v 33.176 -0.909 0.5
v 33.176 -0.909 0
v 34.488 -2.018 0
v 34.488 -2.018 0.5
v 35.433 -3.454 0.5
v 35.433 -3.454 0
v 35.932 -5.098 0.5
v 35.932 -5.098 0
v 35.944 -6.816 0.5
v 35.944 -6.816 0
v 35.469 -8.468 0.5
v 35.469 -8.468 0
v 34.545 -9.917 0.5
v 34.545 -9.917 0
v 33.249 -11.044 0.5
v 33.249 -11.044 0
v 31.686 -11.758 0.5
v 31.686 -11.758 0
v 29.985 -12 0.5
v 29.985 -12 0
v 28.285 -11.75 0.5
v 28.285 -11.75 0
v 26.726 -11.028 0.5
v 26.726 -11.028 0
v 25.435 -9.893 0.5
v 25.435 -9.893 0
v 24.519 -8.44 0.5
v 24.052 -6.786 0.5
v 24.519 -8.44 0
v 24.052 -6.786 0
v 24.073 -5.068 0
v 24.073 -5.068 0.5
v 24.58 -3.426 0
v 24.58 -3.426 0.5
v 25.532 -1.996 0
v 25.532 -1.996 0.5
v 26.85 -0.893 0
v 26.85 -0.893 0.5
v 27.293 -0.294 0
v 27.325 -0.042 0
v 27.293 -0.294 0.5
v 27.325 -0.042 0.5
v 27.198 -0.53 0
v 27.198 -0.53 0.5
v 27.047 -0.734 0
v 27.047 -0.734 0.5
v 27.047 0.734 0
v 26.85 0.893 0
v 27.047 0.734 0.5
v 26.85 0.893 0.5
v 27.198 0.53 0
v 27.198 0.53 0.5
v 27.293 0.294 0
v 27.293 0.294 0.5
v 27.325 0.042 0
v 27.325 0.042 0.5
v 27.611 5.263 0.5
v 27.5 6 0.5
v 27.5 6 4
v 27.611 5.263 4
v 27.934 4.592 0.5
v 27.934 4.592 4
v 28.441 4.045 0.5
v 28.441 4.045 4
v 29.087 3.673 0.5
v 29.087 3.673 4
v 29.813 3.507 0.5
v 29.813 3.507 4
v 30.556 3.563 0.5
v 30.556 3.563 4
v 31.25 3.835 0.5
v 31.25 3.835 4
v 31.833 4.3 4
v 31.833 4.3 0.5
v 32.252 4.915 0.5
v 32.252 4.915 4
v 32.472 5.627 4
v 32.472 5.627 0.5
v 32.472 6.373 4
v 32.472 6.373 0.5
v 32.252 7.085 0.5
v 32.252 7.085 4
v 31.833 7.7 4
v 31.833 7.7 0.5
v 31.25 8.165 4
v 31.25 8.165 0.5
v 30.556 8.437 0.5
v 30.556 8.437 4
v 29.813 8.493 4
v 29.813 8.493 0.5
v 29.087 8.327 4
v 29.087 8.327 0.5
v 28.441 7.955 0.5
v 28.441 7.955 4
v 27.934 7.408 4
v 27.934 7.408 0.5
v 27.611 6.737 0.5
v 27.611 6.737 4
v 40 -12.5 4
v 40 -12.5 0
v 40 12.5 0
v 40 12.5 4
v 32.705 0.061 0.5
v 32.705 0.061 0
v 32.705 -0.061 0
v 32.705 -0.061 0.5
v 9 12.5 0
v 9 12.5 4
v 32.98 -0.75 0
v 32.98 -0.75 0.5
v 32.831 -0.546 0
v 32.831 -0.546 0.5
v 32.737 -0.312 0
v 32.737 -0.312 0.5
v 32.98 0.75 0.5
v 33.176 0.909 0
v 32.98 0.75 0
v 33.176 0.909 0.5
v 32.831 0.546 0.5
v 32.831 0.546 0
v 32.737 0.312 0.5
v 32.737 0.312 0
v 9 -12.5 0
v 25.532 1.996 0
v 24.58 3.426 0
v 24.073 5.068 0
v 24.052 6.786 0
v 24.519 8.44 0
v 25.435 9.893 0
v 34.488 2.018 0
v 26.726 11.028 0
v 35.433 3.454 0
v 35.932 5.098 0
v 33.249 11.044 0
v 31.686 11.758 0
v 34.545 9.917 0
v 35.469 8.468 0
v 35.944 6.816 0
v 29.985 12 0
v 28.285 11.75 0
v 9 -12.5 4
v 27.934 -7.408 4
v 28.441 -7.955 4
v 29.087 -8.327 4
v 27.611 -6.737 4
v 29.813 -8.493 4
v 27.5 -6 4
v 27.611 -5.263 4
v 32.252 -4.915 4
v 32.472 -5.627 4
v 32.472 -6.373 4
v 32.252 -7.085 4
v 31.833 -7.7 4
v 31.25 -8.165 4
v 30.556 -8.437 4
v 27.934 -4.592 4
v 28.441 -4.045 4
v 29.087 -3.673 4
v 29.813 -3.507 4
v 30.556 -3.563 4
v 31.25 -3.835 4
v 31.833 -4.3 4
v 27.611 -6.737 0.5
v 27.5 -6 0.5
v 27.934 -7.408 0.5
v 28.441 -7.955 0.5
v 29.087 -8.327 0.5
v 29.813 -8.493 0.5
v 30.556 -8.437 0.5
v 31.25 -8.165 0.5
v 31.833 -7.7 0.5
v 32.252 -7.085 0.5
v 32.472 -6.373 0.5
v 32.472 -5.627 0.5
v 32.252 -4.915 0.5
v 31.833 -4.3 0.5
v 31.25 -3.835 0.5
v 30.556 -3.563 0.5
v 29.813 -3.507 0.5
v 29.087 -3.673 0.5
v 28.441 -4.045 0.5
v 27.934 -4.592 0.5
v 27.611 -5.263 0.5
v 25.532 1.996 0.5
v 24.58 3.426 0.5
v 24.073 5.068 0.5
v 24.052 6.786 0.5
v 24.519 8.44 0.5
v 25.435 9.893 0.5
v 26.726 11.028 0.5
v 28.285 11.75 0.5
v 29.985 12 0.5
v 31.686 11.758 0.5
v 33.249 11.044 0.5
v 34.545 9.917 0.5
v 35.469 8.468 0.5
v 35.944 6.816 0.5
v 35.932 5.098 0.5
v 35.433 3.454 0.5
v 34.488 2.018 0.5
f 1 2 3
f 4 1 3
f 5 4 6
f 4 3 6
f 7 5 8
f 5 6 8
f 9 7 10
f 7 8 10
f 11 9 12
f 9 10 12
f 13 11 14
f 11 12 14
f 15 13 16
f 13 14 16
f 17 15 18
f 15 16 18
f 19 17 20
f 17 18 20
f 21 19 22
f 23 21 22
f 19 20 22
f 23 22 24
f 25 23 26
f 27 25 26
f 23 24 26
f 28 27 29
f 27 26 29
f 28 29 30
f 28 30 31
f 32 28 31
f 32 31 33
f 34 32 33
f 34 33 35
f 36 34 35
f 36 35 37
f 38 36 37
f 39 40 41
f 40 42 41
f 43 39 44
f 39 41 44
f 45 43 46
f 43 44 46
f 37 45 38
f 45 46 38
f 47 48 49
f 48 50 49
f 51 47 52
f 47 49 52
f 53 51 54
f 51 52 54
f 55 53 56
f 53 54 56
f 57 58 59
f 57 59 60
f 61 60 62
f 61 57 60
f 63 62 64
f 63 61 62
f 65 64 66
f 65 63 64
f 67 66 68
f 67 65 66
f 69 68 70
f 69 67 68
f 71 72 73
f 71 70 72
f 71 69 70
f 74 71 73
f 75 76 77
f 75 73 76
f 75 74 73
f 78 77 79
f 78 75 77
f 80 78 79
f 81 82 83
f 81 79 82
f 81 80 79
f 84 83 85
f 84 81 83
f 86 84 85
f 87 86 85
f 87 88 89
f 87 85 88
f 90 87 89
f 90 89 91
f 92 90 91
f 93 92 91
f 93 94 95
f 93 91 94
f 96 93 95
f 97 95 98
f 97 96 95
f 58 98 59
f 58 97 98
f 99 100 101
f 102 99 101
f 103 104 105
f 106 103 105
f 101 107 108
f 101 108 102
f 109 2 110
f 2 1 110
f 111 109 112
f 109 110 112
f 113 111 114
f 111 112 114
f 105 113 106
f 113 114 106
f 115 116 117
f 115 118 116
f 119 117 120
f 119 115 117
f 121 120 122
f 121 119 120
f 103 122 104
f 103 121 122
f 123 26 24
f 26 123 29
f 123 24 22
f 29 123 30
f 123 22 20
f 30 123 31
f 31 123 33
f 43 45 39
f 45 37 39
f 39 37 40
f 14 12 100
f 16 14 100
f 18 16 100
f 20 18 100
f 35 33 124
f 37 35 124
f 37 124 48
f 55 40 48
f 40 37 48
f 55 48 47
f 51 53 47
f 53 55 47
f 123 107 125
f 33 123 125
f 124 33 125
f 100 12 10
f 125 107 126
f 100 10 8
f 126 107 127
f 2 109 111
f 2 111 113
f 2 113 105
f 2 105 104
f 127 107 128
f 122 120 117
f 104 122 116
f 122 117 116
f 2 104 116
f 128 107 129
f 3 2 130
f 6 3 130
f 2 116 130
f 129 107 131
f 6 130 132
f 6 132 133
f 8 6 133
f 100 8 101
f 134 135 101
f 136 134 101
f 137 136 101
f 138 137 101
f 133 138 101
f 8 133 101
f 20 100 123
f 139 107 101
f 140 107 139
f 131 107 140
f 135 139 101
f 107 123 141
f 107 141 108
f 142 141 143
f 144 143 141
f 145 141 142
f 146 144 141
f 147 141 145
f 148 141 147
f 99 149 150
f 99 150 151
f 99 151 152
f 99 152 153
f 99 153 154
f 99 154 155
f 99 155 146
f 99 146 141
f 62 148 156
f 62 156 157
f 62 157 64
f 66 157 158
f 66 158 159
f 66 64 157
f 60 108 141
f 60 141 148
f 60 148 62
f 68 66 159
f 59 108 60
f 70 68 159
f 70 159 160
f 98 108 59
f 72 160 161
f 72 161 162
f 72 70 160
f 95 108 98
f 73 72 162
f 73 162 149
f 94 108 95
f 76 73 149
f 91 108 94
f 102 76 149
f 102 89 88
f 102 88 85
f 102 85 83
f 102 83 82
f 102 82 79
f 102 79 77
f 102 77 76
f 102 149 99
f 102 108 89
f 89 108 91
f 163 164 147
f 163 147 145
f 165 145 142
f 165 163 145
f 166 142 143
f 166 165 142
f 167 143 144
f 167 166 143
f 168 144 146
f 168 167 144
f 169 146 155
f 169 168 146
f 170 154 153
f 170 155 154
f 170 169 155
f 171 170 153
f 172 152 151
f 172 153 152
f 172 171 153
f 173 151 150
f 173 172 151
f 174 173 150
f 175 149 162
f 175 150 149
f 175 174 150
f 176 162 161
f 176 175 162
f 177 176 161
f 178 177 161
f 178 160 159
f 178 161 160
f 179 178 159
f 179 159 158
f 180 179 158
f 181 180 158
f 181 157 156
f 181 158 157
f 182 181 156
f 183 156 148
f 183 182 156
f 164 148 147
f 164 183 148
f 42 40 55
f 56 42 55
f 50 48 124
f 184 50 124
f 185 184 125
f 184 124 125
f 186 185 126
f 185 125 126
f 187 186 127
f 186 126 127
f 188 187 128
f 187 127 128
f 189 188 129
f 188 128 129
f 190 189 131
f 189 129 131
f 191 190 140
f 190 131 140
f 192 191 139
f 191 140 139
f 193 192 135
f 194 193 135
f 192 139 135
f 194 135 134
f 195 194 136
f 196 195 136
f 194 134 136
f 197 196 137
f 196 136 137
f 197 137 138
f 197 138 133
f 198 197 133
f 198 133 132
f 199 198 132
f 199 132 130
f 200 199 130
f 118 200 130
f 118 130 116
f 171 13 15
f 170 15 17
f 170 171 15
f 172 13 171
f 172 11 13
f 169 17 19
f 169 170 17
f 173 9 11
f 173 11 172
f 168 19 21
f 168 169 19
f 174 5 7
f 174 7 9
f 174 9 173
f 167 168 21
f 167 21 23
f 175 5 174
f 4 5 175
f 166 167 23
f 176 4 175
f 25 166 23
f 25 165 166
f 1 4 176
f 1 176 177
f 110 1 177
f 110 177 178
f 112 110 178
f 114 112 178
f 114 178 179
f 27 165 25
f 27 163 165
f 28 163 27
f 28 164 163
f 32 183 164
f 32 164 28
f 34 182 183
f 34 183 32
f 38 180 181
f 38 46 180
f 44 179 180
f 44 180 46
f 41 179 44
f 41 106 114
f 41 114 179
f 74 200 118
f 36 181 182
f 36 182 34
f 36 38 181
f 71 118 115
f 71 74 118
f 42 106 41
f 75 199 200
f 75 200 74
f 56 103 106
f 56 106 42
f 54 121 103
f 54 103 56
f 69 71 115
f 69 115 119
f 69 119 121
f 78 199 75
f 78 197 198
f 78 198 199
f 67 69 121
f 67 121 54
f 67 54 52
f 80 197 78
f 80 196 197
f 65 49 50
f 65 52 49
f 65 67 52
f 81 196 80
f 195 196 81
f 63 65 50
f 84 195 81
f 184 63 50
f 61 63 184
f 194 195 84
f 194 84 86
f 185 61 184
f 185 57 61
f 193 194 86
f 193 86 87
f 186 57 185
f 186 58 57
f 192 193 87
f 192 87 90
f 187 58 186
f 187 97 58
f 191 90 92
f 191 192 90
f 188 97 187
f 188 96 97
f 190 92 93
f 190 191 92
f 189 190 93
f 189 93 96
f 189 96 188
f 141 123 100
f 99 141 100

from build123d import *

# Parameters (mm, degrees)
SKETCH1_W               = 40
SKETCH1_H               = 25
BOSS_EXTRUDE1_DEPTH     = 4
SKETCH7_W               = 9
SKETCH7_H               = 25
CUT_EXTRUDE5_DEPTH      = 21
SKETCH8_W               = 20
SKETCH8_H               = 25
BOSS_EXTRUDE2_DEPTH     = 4
CUT_EXTRUDE6_DEPTH      = 43.09809972
CUT_EXTRUDE6_DEPTH_BACK = 43.09809972
SKETCH9_R               = 2.5
CUT_EXTRUDE7_DEPTH      = 0.5
FILLET1_R               = 1
SKETCH11_W              = 20
SKETCH11_H              = 25
CUT_EXTRUDE8_DEPTH      = 10


with BuildPart() as part:
    # Sketch1 → Boss-Extrude1 (new body)
    with BuildSketch(Plane.XY):
        Rectangle(SKETCH1_W, SKETCH1_H)
    extrude(amount=BOSS_EXTRUDE1_DEPTH)

    # Sketch7 → Cut-Extrude5 (cut)
    with BuildSketch(Plane.XY):
        with Locations((-15.5, 0)):
            Rectangle(SKETCH7_W, SKETCH7_H)
    extrude(amount=CUT_EXTRUDE5_DEPTH, mode=Mode.SUBTRACT)

    # Sketch8 → Boss-Extrude2 (add)
    with BuildSketch(Plane.XY):
        with Locations((30, 0)):
            Rectangle(SKETCH8_W, SKETCH8_H)
    extrude(amount=BOSS_EXTRUDE2_DEPTH)

    # Sketch9 → Cut-Extrude6 (cut, two sides: drawn at the far end of the back side and taken through both)
    with BuildSketch(Plane.XY.offset(-CUT_EXTRUDE6_DEPTH_BACK)):
        with Locations(Location((30, 6, 0), (0, 0, 180))):
            Circle(SKETCH9_R)
        with Locations(Location((30, -6, 0), (0, 0, 180))):
            Circle(SKETCH9_R)
    extrude(amount=CUT_EXTRUDE6_DEPTH + CUT_EXTRUDE6_DEPTH_BACK, mode=Mode.SUBTRACT)

    # Sketch10 → Cut-Extrude7 (cut)
    with BuildSketch(Plane.XY):
        with BuildLine():
            Line((32.705156976, 0.644430401), (32.705156976, -0.644430401))
            ThreePointArc((32.705156976, -0.644430401), (29.983190138, -11.999976452), (27.324894168, -0.629356762))
            Line((27.324894168, -0.629356762), (27.324894168, 0.629356762))
            ThreePointArc((27.324894168, 0.629356762), (29.983190138, 11.999976452), (32.705156976, 0.644430401))
        make_face()
    extrude(amount=CUT_EXTRUDE7_DEPTH, mode=Mode.SUBTRACT)

    # Fillet1
    fillet1_edges = [part.edges().sort_by_distance(p)[0] for p in [
        (27.324894168, 0.629356762, 0.25),
        (27.324894168, -0.629356762, 0.25),
        (32.705156976, -0.644430401, 0.25),
        (32.705156976, 0.644430401, 0.25),
    ]]
    fillet(fillet1_edges, radius=FILLET1_R)

    # Sketch11 → Cut-Extrude8 (cut)
    with BuildSketch(Plane.XY):
        with Locations((-1, 0)):
            Rectangle(SKETCH11_W, SKETCH11_H)
    extrude(amount=CUT_EXTRUDE8_DEPTH, mode=Mode.SUBTRACT)


solid = part.part
